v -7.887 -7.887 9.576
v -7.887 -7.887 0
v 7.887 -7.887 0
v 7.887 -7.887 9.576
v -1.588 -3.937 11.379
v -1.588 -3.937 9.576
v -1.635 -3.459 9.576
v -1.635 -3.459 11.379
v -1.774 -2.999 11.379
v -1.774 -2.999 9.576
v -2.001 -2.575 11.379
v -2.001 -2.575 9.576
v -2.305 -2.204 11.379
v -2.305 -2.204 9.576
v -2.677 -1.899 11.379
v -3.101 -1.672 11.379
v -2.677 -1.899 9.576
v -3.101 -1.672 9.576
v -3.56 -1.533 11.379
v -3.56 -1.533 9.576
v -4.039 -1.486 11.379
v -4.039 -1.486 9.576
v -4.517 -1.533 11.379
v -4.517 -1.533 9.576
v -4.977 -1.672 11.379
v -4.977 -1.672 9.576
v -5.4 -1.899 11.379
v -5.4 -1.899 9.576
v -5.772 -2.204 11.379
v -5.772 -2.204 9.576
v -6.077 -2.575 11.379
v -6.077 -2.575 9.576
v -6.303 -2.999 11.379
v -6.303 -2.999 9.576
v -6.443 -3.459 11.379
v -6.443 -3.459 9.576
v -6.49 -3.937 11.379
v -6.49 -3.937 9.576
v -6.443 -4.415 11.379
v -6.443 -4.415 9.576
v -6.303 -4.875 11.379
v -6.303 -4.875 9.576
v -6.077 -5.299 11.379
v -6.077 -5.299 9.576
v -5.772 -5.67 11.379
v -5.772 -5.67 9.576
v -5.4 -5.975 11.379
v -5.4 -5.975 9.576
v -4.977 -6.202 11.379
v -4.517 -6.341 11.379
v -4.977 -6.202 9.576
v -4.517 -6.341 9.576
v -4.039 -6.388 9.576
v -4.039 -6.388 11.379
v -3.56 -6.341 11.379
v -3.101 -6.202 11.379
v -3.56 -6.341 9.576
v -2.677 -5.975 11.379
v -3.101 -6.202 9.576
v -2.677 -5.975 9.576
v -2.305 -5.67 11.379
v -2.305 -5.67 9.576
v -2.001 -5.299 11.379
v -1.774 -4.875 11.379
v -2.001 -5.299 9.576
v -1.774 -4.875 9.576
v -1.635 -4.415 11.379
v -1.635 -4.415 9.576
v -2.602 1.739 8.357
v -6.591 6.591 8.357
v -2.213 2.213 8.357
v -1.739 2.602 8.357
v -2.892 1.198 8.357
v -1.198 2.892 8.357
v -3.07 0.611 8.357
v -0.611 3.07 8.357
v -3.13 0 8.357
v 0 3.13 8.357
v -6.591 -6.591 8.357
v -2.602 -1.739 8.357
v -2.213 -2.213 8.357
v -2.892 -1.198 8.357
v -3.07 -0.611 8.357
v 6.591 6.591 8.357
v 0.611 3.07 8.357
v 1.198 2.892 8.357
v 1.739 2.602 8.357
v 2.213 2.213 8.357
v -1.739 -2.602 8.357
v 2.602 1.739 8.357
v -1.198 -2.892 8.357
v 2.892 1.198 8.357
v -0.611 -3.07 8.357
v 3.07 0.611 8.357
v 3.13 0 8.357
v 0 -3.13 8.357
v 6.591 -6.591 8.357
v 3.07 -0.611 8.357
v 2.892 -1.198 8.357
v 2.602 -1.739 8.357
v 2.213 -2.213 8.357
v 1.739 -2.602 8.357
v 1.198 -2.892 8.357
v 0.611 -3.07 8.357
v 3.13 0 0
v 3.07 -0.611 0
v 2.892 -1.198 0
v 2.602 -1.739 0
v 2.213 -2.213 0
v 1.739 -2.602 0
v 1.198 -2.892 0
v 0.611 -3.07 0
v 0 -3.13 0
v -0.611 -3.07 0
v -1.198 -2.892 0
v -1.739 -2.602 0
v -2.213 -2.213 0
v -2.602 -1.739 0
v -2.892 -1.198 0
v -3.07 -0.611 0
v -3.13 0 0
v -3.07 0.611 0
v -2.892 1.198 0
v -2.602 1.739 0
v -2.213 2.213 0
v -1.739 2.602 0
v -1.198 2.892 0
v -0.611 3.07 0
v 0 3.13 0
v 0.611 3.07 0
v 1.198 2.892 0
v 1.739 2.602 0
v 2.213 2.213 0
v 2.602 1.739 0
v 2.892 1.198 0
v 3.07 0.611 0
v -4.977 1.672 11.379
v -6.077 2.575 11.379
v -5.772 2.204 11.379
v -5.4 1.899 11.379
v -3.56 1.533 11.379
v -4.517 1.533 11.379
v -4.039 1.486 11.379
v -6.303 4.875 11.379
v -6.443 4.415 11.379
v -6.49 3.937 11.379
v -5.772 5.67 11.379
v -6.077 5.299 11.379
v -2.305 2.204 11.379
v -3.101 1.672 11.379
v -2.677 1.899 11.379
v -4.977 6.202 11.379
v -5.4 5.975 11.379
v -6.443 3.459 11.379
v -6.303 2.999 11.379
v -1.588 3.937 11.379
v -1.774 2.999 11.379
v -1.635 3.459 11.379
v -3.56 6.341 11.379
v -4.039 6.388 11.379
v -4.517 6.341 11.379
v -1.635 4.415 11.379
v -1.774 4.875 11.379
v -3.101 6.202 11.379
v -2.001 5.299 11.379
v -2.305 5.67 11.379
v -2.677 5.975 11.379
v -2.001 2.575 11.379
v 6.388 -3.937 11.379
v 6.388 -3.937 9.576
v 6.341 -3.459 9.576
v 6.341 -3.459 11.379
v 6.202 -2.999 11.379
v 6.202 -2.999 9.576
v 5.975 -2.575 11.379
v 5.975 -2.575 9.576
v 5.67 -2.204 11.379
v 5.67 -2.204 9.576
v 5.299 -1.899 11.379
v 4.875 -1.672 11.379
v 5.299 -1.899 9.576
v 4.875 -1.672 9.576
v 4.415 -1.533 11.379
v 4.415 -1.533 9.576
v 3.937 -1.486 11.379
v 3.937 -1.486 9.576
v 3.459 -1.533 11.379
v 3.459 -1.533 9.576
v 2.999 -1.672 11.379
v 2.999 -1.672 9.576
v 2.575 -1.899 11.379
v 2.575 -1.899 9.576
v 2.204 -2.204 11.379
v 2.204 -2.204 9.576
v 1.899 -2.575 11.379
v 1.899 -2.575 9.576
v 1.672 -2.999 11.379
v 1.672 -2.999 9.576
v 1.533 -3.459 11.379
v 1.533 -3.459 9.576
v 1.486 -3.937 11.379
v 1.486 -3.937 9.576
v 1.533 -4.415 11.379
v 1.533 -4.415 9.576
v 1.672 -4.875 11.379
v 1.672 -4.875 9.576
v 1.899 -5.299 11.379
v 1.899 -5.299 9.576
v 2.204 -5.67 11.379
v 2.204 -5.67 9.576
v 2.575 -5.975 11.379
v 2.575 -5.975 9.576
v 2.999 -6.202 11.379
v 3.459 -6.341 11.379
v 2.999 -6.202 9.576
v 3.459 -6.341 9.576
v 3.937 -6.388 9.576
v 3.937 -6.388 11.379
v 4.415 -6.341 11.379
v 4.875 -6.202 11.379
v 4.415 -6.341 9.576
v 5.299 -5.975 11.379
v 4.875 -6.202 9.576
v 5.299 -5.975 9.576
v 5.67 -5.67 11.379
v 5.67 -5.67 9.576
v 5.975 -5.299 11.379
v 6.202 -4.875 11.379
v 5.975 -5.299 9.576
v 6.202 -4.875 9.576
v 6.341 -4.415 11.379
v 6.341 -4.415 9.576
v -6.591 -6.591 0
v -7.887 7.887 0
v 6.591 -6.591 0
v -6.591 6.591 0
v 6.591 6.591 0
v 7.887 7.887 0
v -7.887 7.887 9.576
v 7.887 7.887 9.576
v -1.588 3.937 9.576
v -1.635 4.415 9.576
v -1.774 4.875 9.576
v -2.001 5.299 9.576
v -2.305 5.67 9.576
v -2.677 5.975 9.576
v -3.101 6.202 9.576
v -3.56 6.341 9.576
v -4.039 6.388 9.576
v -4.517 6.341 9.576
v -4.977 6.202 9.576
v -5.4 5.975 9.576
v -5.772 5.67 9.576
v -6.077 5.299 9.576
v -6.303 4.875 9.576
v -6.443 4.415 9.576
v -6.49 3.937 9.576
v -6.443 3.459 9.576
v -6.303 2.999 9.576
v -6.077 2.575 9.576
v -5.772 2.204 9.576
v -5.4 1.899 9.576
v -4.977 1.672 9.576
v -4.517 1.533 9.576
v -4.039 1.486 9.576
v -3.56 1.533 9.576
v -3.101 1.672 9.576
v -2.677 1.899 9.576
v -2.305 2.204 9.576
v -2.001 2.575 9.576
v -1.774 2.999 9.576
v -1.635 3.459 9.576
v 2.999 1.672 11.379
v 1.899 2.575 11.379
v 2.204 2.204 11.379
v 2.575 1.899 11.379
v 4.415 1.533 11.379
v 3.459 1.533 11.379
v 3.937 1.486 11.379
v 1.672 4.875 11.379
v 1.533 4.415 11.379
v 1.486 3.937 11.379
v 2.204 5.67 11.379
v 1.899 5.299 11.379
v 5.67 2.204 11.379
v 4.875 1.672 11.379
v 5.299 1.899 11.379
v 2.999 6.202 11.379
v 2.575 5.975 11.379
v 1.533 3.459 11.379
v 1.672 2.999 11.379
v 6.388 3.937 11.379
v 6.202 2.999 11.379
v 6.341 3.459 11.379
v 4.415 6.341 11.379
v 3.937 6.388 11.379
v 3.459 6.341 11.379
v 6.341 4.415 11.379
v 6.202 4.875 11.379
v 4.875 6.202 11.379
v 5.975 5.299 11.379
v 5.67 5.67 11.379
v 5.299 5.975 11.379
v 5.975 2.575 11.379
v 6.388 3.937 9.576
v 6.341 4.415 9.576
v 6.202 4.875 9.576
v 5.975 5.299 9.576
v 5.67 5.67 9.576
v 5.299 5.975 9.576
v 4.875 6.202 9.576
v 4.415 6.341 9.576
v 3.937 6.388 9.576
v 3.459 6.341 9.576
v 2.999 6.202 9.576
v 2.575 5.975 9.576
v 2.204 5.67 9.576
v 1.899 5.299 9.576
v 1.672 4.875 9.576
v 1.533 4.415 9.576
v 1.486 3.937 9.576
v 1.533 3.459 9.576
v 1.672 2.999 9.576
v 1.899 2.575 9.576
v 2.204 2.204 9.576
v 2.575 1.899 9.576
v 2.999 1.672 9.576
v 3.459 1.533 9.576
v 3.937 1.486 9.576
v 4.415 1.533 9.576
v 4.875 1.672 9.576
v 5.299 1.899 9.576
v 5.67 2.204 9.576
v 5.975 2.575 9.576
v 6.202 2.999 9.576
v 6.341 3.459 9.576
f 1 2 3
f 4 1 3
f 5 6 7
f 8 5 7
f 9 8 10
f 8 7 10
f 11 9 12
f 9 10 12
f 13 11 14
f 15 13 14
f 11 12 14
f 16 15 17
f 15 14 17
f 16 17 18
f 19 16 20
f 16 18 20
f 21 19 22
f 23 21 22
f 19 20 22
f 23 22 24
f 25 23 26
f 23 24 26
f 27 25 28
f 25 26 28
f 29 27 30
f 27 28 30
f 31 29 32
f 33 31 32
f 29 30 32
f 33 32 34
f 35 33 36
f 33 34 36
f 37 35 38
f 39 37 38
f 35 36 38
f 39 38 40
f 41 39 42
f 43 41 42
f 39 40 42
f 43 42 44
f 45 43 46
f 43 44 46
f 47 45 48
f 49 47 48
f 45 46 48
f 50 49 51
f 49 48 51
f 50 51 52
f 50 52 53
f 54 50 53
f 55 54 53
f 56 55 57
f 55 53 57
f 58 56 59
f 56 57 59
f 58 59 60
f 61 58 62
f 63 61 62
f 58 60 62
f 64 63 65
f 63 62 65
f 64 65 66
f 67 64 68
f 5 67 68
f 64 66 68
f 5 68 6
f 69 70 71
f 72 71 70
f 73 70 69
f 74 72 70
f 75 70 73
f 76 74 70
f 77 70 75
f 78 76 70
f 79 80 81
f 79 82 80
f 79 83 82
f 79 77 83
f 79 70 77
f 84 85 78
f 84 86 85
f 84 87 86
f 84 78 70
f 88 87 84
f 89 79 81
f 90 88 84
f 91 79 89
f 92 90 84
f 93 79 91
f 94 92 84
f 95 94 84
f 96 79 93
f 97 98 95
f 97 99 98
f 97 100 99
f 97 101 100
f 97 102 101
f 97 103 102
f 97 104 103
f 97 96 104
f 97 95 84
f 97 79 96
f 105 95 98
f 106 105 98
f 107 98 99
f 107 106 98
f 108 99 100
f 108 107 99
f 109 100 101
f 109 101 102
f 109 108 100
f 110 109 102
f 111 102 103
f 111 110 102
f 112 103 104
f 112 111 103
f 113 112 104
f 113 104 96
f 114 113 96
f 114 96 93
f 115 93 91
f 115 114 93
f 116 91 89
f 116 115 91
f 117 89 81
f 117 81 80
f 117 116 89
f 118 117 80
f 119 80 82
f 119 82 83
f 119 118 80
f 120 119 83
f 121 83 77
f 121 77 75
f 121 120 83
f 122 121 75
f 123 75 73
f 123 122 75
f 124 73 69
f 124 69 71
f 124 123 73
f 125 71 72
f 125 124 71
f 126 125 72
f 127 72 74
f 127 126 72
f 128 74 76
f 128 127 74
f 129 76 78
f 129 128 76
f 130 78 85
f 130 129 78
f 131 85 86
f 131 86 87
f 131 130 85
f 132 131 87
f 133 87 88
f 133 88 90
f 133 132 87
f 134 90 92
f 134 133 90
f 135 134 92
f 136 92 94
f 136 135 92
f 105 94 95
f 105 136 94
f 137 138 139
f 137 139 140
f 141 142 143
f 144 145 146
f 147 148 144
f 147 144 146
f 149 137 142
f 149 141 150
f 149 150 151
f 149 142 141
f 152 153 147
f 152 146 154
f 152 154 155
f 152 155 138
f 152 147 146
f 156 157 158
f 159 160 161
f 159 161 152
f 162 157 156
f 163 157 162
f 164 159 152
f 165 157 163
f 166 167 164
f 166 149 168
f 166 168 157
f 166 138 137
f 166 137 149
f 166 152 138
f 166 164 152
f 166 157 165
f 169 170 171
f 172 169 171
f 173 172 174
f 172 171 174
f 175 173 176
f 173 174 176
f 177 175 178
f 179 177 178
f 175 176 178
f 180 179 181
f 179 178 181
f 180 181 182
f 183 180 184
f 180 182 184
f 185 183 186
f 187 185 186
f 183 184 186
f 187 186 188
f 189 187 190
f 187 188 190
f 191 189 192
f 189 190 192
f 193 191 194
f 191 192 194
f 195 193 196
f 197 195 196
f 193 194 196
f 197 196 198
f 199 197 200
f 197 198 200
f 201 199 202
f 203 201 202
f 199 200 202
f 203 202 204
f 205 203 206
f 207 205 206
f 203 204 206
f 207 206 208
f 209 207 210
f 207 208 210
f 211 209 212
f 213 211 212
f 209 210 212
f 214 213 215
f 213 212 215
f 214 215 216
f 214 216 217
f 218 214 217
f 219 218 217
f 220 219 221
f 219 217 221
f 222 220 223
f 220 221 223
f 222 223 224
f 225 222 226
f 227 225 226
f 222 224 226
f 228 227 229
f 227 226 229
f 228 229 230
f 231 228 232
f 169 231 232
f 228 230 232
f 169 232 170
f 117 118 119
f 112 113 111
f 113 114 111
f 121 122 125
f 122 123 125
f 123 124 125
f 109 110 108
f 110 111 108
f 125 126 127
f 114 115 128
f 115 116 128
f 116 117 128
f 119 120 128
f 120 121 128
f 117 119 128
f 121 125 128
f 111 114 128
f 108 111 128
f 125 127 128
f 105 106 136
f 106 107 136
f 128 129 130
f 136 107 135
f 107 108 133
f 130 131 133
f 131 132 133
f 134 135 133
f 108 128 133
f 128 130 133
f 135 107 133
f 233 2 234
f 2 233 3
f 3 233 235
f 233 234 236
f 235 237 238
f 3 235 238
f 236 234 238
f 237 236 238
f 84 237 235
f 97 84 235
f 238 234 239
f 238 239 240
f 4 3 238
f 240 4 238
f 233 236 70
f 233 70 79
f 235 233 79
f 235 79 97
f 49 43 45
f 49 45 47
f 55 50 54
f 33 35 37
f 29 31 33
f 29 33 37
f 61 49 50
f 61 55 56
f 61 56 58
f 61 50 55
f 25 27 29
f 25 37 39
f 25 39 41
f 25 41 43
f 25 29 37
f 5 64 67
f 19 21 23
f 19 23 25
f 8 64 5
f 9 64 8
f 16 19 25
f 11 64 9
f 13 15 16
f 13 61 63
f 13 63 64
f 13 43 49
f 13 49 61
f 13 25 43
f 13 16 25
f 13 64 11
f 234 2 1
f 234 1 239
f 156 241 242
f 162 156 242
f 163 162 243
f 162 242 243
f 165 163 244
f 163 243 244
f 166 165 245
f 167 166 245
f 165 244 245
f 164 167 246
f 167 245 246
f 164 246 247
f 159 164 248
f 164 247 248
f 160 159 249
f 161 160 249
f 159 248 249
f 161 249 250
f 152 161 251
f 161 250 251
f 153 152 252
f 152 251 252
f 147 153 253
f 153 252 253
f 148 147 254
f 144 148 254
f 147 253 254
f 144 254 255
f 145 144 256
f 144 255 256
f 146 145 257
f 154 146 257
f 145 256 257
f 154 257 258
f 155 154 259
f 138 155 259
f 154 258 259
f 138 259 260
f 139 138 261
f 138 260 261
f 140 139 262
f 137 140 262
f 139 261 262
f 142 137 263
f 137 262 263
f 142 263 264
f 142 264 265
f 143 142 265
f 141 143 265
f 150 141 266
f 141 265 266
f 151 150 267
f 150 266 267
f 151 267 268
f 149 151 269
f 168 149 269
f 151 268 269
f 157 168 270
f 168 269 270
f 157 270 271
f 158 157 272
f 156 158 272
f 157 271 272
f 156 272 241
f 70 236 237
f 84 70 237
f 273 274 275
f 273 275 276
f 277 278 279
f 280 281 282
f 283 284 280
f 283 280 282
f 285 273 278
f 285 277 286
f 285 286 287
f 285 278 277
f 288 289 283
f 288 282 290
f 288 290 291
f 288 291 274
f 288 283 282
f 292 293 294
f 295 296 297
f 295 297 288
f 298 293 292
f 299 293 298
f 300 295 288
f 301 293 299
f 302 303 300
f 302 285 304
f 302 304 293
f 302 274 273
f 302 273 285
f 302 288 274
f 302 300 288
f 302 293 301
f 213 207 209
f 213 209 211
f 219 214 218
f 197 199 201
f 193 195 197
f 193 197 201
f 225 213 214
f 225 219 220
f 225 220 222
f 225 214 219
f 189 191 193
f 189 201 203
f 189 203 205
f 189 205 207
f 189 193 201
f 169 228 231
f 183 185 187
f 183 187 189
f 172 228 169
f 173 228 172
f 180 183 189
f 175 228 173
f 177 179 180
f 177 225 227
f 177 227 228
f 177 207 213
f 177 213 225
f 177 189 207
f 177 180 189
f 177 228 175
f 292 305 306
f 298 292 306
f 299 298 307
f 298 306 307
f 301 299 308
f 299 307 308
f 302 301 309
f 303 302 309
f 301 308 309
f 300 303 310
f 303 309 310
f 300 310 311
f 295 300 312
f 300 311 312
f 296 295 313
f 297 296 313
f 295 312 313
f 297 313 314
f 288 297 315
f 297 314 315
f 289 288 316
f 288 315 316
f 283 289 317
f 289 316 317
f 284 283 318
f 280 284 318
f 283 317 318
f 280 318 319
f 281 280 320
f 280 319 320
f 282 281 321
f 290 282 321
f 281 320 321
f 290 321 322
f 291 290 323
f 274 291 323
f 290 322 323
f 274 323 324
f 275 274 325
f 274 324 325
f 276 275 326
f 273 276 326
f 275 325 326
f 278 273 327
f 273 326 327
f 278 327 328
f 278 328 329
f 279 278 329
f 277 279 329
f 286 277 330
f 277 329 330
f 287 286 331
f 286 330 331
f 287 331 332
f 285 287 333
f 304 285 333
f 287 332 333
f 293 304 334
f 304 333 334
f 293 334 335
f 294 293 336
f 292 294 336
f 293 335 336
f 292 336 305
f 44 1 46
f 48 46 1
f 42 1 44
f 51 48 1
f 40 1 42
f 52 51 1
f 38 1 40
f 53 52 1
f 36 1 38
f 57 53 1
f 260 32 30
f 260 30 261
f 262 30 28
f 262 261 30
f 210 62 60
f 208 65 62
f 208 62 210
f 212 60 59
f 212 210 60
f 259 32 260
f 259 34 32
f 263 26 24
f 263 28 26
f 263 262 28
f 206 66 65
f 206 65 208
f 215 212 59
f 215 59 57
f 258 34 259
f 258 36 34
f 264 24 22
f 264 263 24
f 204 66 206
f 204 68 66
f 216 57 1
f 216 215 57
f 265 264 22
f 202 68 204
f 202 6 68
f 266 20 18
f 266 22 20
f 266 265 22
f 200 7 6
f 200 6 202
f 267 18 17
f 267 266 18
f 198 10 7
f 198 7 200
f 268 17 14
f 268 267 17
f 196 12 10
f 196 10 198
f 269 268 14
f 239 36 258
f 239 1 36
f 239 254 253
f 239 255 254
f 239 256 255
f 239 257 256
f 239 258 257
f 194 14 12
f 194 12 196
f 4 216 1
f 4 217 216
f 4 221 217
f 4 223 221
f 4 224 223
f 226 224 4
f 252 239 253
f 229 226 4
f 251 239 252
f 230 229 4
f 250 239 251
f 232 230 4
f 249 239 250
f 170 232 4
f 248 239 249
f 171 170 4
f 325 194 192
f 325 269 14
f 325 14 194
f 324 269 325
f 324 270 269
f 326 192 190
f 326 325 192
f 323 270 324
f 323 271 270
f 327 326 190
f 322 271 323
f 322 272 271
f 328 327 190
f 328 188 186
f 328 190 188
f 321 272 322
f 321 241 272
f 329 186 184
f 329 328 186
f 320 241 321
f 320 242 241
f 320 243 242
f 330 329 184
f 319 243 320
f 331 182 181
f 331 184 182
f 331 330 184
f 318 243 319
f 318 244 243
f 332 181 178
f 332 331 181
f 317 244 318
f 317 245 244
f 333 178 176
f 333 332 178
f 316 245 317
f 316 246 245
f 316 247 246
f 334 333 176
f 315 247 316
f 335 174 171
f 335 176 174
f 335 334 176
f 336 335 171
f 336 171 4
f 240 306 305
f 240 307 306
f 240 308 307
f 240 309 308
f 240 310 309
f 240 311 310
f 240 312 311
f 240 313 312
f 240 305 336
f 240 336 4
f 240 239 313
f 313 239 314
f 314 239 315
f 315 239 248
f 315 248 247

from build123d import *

# Parameters (mm, degrees)
F0_W     = 15.7734
F0_H     = 15.7734
F1_DEPTH = 9.5758
F2_R     = 2.4511
F3_DEPTH = 1.8034
F5_W     = 13.1826
F5_H     = 13.1826
F5_R     = 3.1299195118
F6_DEPTH = 8.3566


# Not quite as in the source:
# - a feature names something its author has since deleted; it is built from what else it names


with BuildPart() as f1:
    # F0 (on Top) → F1 (new body)
    with BuildSketch(Plane.XY):
        Rectangle(F0_W, F0_H)
    extrude(amount=F1_DEPTH)

    # F2 (on face) → F3 (join)
    with BuildSketch(Plane.XY.offset(9.5758)):
        with Locations((-4.0386, -3.937)):
            Circle(F2_R)
        with Locations((3.937, -3.937)):
            Circle(F2_R)
        with Locations((3.937, 3.937)):
            Circle(F2_R)
        with Locations((-4.0386, 3.937)):
            Circle(F2_R)
    extrude(amount=F3_DEPTH)

    # F5 (on face) → F6 (cut)
    with BuildSketch(Plane(origin=(0, 0, 0), x_dir=(1, 0, 0), z_dir=(0, 0, -1))):
        Rectangle(F5_W, F5_H)
        Circle(F5_R, mode=Mode.SUBTRACT)
    extrude(amount=-F6_DEPTH, mode=Mode.SUBTRACT)


solid = f1.part
